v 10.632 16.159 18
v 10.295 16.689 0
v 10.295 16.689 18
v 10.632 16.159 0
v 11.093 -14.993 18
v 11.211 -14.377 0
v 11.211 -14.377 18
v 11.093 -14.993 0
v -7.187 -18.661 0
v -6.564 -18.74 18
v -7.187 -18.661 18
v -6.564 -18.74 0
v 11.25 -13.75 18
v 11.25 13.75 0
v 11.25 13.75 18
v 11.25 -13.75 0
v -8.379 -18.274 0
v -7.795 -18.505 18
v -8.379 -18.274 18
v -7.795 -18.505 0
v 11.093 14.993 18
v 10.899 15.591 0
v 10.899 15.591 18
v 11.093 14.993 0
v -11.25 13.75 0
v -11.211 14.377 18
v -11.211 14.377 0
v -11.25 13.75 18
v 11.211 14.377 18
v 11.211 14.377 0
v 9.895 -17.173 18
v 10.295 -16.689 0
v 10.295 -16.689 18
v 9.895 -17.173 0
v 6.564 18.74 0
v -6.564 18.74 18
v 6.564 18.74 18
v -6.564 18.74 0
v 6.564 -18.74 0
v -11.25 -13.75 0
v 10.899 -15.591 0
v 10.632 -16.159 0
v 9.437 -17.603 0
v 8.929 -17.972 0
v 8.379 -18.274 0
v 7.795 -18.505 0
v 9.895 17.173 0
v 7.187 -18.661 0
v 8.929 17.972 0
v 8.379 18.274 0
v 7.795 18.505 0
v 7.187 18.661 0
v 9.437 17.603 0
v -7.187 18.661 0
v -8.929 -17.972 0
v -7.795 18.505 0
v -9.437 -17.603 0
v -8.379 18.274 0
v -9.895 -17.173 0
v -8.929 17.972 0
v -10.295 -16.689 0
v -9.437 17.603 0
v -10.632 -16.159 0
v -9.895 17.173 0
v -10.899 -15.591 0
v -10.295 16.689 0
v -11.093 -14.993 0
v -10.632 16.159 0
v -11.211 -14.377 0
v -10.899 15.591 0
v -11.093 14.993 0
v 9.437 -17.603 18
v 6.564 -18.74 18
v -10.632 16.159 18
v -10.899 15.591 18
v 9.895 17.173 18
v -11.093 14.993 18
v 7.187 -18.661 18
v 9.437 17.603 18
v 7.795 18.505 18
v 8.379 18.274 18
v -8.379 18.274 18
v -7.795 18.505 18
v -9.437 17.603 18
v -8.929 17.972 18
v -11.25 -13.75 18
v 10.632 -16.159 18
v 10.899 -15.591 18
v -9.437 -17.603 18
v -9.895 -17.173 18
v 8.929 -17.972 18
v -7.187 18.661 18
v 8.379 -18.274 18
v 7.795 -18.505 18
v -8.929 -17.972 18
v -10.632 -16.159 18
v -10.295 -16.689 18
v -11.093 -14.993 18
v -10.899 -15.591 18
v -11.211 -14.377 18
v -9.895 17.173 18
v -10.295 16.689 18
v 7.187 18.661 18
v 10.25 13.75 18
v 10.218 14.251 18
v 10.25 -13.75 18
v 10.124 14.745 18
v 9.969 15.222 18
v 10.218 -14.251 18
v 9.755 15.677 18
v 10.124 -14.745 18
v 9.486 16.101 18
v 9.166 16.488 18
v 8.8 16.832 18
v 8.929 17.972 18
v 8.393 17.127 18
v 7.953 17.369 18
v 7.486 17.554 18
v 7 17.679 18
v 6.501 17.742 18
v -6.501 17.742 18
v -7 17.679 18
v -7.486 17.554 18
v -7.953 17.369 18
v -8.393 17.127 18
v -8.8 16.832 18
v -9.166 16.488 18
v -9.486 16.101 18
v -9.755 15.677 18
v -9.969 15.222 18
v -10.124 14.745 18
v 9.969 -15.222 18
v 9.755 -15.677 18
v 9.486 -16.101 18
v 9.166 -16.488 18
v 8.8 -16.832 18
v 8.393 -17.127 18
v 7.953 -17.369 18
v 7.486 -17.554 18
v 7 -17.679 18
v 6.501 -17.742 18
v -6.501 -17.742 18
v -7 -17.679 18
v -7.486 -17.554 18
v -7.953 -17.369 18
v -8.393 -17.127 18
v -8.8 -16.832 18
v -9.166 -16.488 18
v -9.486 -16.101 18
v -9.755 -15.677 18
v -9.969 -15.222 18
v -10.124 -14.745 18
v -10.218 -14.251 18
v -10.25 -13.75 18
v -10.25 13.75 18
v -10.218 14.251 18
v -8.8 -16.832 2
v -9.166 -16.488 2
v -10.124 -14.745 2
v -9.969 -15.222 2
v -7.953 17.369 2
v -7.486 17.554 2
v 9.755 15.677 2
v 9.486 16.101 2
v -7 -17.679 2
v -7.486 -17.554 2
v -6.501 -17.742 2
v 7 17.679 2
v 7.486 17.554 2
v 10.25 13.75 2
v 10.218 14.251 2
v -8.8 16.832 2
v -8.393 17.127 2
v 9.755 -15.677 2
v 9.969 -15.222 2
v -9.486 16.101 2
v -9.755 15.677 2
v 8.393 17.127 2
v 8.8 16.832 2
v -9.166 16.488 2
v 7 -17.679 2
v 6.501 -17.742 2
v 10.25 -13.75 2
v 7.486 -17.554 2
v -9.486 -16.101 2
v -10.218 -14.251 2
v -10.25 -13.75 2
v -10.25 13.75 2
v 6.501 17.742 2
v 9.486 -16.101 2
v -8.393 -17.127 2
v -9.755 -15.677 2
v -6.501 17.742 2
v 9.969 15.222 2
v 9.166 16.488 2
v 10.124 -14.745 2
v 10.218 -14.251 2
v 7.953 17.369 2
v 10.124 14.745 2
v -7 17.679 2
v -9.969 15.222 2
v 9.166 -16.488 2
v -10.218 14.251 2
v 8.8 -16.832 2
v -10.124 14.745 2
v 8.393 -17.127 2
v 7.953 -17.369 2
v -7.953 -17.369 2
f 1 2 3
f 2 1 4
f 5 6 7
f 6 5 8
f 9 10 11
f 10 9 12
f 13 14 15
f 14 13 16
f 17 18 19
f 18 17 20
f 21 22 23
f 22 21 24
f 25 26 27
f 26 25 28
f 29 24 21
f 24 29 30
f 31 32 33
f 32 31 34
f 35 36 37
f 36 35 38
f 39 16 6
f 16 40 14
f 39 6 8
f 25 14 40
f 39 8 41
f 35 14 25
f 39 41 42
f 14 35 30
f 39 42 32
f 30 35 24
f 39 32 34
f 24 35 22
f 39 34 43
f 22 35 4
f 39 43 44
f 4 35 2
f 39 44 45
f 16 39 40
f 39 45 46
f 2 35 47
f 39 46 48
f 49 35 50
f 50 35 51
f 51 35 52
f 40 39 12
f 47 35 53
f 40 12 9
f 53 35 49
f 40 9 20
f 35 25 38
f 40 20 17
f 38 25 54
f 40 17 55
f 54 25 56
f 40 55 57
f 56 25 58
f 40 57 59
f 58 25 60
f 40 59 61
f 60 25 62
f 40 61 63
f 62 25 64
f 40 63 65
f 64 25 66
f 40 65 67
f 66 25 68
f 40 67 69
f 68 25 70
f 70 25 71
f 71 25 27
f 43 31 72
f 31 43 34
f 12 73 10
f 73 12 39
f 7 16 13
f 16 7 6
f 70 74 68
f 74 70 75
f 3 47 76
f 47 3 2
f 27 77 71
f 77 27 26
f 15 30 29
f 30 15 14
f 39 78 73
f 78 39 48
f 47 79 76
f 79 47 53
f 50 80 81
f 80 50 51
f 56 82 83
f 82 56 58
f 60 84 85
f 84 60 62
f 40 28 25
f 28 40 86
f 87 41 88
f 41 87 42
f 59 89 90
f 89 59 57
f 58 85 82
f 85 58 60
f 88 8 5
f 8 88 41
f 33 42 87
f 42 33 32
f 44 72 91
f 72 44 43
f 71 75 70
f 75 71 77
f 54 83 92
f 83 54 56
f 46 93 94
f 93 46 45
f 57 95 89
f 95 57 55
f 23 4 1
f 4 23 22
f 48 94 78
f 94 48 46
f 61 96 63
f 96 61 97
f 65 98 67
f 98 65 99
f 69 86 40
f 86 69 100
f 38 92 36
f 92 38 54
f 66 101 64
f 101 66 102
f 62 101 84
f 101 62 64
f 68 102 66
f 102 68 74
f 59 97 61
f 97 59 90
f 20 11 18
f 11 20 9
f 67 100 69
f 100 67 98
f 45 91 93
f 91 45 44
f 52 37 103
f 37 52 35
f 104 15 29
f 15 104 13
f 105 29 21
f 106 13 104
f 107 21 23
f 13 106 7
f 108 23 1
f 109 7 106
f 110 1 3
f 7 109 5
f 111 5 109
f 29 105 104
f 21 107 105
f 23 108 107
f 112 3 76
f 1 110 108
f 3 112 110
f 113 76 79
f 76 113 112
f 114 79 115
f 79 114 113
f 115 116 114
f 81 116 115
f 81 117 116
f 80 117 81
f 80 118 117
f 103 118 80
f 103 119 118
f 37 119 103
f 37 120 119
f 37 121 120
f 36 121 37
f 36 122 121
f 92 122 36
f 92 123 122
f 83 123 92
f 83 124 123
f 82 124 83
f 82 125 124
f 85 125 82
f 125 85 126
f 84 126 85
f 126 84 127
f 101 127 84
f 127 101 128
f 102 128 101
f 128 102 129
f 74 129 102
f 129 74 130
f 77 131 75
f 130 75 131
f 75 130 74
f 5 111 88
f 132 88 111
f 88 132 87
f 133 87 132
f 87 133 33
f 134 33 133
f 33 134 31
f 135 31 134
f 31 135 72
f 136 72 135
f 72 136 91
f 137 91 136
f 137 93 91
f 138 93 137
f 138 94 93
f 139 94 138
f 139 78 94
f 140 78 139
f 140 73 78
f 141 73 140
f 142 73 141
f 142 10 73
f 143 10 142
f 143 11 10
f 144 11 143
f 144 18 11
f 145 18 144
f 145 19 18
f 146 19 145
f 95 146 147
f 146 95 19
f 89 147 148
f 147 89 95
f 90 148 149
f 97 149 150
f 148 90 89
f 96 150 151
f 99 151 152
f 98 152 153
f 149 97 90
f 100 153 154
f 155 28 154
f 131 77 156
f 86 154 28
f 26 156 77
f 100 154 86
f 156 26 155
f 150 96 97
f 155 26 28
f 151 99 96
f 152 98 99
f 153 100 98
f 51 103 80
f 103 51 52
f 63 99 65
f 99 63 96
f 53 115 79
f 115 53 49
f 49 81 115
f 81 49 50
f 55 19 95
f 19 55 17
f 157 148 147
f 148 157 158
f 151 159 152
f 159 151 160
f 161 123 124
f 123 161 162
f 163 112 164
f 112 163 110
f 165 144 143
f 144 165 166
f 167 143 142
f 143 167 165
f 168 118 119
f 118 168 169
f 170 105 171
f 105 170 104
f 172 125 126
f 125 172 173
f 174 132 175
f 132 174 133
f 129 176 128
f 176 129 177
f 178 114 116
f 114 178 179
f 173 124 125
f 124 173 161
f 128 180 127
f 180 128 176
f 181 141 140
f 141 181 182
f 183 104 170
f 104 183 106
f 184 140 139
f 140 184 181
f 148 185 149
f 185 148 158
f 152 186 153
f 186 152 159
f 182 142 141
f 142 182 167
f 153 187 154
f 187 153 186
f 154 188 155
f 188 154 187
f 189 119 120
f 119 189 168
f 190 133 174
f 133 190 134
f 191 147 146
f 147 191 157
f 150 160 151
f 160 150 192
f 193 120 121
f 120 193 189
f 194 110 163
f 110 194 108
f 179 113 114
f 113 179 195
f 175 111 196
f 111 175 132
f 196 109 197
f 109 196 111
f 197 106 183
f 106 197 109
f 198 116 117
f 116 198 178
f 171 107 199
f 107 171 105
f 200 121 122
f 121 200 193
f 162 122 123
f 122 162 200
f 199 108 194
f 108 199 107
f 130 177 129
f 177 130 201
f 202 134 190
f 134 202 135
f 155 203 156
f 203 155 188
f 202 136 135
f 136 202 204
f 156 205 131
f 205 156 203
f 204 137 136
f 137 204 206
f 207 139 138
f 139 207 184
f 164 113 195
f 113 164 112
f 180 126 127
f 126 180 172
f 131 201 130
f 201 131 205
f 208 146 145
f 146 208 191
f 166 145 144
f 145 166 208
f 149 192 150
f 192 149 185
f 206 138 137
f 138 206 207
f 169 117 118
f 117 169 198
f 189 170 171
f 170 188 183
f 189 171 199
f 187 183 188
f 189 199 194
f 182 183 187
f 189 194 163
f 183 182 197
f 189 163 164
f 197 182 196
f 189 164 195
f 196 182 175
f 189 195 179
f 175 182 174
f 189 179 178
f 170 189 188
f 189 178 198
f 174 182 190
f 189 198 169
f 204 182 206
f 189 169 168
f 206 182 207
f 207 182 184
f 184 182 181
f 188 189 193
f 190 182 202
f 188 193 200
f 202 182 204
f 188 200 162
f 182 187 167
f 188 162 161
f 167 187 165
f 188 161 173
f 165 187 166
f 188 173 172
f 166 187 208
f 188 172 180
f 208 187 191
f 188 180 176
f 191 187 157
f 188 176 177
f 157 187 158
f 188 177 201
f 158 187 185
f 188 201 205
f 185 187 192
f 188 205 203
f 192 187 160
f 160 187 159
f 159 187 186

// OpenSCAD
$fn = 50;


difference() {
	union() {
		hull() {
			translate(v = [-6.2500000000, 13.7500000000, 0]) {
				cylinder(h = 18, r = 5);
			}
			translate(v = [6.2500000000, 13.7500000000, 0]) {
				cylinder(h = 18, r = 5);
			}
			translate(v = [-6.2500000000, -13.7500000000, 0]) {
				cylinder(h = 18, r = 5);
			}
			translate(v = [6.2500000000, -13.7500000000, 0]) {
				cylinder(h = 18, r = 5);
			}
		}
	}
	union() {
		translate(v = [0, 0, 2]) {
			hull() {
				translate(v = [-6.2500000000, 13.7500000000, 0]) {
					cylinder(h = 16, r = 4);
				}
				translate(v = [6.2500000000, 13.7500000000, 0]) {
					cylinder(h = 16, r = 4);
				}
				translate(v = [-6.2500000000, -13.7500000000, 0]) {
					cylinder(h = 16, r = 4);
				}
				translate(v = [6.2500000000, -13.7500000000, 0]) {
					cylinder(h = 16, r = 4);
				}
			}
		}
	}
}
